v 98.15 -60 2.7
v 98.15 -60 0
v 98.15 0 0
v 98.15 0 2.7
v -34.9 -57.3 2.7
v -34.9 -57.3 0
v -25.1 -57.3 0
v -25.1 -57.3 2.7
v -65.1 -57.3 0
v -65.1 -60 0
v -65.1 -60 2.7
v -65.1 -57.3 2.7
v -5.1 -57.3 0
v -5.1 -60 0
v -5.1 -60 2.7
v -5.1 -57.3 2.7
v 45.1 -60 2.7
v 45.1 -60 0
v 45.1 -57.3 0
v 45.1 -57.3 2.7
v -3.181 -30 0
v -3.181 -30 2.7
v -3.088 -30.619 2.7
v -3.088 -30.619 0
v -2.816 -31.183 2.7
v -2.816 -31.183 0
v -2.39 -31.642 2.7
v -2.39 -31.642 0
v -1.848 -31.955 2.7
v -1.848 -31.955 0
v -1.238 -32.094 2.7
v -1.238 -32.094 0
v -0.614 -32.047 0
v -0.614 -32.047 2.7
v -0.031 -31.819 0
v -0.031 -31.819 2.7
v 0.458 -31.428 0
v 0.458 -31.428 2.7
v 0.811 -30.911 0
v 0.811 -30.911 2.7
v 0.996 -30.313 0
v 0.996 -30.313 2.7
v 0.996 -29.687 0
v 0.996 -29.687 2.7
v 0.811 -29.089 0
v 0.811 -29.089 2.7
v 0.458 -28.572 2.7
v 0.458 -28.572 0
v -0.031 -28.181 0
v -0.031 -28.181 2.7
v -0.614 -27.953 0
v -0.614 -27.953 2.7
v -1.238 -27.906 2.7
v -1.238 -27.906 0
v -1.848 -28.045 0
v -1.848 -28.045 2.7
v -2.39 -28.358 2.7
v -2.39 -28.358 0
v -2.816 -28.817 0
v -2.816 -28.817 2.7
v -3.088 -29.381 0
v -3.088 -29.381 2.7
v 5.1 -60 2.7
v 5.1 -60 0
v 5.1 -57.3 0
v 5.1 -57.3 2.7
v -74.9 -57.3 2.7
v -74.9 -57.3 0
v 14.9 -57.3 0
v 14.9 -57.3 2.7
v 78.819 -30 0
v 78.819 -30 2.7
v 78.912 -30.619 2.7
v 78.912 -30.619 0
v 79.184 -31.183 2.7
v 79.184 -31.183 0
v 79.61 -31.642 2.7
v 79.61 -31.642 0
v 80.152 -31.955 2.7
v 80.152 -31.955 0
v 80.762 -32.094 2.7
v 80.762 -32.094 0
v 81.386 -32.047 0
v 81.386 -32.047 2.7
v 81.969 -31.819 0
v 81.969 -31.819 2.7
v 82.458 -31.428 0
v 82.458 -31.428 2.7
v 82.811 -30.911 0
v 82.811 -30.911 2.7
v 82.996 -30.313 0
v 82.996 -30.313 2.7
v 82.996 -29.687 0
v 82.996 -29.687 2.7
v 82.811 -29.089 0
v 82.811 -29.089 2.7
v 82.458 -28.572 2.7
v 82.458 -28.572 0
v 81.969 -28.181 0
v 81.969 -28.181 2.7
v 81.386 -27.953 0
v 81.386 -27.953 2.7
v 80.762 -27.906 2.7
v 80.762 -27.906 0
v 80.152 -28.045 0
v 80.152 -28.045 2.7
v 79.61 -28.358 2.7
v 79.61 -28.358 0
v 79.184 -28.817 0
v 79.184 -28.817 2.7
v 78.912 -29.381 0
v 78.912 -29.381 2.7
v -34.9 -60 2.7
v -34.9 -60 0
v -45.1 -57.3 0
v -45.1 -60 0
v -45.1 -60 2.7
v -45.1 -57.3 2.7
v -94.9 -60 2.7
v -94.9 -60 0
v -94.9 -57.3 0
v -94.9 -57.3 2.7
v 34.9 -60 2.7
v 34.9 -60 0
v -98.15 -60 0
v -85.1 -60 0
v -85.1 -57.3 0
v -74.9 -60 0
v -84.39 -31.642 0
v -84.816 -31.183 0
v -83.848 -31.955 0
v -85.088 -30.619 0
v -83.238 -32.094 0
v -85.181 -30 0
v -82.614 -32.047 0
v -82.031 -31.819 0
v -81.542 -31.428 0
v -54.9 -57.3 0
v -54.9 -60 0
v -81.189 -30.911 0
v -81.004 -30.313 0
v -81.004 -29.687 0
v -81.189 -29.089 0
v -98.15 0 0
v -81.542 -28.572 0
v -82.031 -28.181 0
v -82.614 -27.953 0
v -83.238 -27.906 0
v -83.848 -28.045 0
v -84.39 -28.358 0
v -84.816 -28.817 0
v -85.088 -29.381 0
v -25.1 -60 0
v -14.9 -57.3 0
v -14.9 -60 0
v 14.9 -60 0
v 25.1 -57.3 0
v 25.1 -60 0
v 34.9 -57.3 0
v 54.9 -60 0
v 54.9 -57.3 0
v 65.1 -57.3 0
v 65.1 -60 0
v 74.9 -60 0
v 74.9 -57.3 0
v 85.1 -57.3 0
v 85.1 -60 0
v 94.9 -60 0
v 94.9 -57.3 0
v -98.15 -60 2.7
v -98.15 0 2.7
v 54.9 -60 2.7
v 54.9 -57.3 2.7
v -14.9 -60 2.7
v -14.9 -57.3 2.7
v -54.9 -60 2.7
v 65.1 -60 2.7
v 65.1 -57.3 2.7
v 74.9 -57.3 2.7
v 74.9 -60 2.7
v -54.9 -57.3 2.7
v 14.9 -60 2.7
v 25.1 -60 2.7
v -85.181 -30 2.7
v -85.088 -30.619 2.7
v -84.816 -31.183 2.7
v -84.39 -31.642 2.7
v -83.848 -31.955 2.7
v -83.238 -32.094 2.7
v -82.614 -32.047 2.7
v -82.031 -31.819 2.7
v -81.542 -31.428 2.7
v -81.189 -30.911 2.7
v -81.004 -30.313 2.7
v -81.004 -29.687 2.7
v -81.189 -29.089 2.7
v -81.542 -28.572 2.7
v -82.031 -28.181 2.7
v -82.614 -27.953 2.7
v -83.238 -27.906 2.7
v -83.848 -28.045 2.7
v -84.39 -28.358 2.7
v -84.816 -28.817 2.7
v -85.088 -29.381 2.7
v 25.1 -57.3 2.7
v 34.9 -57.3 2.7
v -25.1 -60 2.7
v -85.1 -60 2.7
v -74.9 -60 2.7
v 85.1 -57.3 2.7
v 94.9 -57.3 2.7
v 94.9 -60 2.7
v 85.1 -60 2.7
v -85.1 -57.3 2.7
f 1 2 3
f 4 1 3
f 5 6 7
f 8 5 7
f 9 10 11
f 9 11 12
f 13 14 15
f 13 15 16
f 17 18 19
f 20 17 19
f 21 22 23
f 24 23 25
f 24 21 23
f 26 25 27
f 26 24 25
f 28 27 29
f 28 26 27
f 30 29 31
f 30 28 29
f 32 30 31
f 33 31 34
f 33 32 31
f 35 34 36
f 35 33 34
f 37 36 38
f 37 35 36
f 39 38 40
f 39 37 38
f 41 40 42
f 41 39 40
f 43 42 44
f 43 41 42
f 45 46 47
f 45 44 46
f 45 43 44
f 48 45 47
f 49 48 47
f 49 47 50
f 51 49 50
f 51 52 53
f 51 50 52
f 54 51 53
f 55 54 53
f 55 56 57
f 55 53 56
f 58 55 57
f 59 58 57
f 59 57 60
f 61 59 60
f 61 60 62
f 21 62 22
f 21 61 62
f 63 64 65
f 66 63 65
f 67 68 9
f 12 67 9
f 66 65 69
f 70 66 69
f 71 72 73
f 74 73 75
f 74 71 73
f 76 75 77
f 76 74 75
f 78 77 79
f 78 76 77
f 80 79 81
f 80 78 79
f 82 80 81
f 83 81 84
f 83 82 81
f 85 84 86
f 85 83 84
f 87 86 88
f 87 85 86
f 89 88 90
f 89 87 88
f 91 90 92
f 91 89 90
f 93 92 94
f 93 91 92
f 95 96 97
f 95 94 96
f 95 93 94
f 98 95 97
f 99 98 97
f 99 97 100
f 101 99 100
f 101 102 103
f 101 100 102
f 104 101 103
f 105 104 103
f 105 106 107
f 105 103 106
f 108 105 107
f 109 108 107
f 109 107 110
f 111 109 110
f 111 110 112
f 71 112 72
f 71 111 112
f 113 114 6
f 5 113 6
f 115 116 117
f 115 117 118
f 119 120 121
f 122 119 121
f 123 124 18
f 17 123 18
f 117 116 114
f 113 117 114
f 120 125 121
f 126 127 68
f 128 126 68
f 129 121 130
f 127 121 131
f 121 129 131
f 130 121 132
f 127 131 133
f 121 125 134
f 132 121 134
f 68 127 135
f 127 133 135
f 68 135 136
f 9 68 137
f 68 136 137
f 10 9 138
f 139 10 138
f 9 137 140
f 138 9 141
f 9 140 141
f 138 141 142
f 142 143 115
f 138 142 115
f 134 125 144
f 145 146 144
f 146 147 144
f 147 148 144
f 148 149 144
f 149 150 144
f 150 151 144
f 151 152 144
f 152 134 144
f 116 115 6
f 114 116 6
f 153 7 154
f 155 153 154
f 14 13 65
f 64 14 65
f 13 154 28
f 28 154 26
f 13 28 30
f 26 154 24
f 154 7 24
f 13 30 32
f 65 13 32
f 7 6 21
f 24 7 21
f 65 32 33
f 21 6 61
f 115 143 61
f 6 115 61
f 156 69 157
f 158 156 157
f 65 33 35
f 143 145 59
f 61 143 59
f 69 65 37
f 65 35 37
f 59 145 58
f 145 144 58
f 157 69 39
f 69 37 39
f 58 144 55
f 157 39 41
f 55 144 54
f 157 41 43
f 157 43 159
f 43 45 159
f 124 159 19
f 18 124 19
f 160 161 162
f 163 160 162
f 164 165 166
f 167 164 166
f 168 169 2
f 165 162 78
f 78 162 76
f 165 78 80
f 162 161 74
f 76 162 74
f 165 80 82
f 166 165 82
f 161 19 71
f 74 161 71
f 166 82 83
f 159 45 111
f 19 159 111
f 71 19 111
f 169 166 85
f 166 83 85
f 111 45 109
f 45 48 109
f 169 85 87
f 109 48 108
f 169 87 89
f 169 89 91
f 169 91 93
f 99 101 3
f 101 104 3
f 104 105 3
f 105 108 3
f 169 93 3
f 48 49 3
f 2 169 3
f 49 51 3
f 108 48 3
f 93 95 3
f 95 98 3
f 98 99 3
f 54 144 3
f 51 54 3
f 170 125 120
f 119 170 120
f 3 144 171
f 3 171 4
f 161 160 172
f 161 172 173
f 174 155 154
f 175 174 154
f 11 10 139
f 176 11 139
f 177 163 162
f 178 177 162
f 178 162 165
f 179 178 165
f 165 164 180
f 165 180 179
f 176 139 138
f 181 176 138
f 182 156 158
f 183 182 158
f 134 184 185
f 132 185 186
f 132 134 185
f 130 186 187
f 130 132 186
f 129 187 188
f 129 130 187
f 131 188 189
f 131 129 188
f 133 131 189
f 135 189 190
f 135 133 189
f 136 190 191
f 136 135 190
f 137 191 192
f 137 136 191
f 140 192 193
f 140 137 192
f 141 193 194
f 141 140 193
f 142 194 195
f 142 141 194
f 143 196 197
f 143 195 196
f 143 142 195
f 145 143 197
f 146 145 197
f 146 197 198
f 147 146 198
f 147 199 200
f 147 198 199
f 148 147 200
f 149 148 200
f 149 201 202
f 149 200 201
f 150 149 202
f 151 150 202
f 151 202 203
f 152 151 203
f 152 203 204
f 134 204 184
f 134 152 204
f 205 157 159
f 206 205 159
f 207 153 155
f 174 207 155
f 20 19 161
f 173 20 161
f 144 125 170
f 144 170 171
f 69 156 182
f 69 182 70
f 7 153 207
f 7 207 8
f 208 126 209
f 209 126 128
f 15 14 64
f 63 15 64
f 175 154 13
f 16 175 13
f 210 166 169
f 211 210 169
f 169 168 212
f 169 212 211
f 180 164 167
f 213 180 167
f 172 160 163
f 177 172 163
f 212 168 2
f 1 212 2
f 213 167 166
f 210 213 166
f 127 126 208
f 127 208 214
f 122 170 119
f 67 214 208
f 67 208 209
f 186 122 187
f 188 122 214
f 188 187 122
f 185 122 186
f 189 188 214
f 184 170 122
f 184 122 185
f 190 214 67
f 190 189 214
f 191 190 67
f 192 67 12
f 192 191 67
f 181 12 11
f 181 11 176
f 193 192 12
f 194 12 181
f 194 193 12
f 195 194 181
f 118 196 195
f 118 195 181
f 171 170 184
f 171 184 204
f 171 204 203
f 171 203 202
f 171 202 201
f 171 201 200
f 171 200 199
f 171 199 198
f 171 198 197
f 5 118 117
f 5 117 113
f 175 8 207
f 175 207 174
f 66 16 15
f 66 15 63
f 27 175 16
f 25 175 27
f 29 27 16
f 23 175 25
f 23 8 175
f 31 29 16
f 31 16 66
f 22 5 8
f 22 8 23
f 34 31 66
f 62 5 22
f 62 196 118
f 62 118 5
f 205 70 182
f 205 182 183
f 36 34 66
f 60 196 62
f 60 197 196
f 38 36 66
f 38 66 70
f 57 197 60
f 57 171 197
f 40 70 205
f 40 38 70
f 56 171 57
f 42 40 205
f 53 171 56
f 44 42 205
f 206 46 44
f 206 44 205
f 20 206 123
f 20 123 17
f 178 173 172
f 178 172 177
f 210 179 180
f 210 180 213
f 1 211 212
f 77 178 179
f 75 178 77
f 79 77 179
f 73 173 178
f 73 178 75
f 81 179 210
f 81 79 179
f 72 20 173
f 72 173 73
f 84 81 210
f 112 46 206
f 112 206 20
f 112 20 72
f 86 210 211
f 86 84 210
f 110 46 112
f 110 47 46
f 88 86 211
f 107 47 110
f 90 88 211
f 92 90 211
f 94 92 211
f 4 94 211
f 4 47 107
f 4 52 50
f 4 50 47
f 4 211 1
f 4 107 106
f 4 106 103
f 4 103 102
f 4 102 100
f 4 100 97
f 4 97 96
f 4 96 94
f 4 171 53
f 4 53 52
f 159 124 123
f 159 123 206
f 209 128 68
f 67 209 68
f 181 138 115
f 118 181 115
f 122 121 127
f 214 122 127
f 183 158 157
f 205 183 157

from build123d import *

# Parameters (mm, degrees)
ESQUISSE1_W                    = 196.3
ESQUISSE1_H                    = 60
BOSS_EXTRU_1_DEPTH             = 2.7
ESQUISSE3_W                    = 9.8
ESQUISSE3_H                    = 2.7
ENL_V_MAT_EXTRU_1_DEPTH        = 2.7
R_P_TITION_LIN_AIRE2_COUNT     = 5
R_P_TITION_LIN_AIRE2_PITCH     = 20
R_P_TITION_LIN_AIRE2_COL_COUNT = 6
R_P_TITION_LIN_AIRE2_COL_PITCH = 20
ESQUISSE5_R                    = 2.1
ENL_V_MAT_EXTRU_3_DEPTH        = 10


with BuildPart() as part:
    # Esquisse1 → Boss.-Extru.1 (new body)
    with BuildSketch(Plane.XY):
        with Locations((0, -30)):
            Rectangle(ESQUISSE1_W, ESQUISSE1_H)
    extrude(amount=BOSS_EXTRU_1_DEPTH)

    # Esquisse3 → Enlèv. mat.-Extru.1 (cut)
    with BuildSketch(Plane.XY):
        with Locations((10, -58.65)):
            Rectangle(ESQUISSE3_W, ESQUISSE3_H)
    enl_v_mat_extru_1 = extrude(amount=ENL_V_MAT_EXTRU_1_DEPTH, mode=Mode.SUBTRACT)

    # Répétition linéaire2: Enlèv. mat.-Extru.1 ×5
    with Locations(*[(i * R_P_TITION_LIN_AIRE2_PITCH, 0, 0) for i in range(1, R_P_TITION_LIN_AIRE2_COUNT)]):
        add(enl_v_mat_extru_1, mode=Mode.SUBTRACT)

    # Répétition linéaire2 col: Enlèv. mat.-Extru.1 ×6
    with Locations(*[(-i * R_P_TITION_LIN_AIRE2_COL_PITCH, 0, 0) for i in range(1, R_P_TITION_LIN_AIRE2_COL_COUNT)]):
        add(enl_v_mat_extru_1, mode=Mode.SUBTRACT)

    # Esquisse5 → Enlèv. mat.-Extru.3 (cut)
    with BuildSketch(Plane.XY):
        with Locations((-83.081, -30)):
            Circle(ESQUISSE5_R)
        with Locations((-1.081, -30)):
            Circle(ESQUISSE5_R)
        with Locations((80.919, -30)):
            Circle(ESQUISSE5_R)
    extrude(amount=ENL_V_MAT_EXTRU_3_DEPTH, mode=Mode.SUBTRACT)


solid = part.part
